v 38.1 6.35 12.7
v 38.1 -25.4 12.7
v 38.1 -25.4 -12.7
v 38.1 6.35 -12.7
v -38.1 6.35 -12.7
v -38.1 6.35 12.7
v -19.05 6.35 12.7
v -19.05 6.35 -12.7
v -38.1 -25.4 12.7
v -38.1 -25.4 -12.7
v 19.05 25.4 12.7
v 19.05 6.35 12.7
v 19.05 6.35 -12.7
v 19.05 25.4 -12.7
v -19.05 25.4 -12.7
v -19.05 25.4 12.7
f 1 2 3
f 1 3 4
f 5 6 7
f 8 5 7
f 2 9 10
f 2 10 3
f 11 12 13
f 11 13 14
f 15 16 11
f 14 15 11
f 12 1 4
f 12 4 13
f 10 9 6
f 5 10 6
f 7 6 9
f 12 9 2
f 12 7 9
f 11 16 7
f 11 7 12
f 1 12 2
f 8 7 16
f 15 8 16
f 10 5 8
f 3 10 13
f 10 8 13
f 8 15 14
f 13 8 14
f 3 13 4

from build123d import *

# Parameters (mm, degrees)
SKETCH1_W           = 76.2
SKETCH1_H           = 50.8
BOSS_EXTRUDE1_DEPTH = 12.7
SKETCH2_W           = 19.05
SKETCH2_H           = 19.05
CUT_EXTRUDE1_DEPTH  = 26.4


with BuildPart() as part:
    # Sketch1 → Boss-Extrude1 (new body, symmetric)
    with BuildSketch(Plane.XY):
        Rectangle(SKETCH1_W, SKETCH1_H)
    extrude(amount=BOSS_EXTRUDE1_DEPTH, both=True)

    # Sketch2 → Cut-Extrude1 (cut, through all)
    with BuildSketch(Plane.XY.offset(12.7)):
        with Locations((-28.575, 15.875)):
            Rectangle(SKETCH2_W, SKETCH2_H)
    cut_extrude1 = extrude(amount=-CUT_EXTRUDE1_DEPTH, mode=Mode.SUBTRACT)

    # Mirror1: Cut-Extrude1 across plane
    add(cut_extrude1.mirror(Plane(origin=(0, 0, 0), x_dir=(0, 0, 1), z_dir=(1, 0, 0))), mode=Mode.SUBTRACT)


solid = part.part
